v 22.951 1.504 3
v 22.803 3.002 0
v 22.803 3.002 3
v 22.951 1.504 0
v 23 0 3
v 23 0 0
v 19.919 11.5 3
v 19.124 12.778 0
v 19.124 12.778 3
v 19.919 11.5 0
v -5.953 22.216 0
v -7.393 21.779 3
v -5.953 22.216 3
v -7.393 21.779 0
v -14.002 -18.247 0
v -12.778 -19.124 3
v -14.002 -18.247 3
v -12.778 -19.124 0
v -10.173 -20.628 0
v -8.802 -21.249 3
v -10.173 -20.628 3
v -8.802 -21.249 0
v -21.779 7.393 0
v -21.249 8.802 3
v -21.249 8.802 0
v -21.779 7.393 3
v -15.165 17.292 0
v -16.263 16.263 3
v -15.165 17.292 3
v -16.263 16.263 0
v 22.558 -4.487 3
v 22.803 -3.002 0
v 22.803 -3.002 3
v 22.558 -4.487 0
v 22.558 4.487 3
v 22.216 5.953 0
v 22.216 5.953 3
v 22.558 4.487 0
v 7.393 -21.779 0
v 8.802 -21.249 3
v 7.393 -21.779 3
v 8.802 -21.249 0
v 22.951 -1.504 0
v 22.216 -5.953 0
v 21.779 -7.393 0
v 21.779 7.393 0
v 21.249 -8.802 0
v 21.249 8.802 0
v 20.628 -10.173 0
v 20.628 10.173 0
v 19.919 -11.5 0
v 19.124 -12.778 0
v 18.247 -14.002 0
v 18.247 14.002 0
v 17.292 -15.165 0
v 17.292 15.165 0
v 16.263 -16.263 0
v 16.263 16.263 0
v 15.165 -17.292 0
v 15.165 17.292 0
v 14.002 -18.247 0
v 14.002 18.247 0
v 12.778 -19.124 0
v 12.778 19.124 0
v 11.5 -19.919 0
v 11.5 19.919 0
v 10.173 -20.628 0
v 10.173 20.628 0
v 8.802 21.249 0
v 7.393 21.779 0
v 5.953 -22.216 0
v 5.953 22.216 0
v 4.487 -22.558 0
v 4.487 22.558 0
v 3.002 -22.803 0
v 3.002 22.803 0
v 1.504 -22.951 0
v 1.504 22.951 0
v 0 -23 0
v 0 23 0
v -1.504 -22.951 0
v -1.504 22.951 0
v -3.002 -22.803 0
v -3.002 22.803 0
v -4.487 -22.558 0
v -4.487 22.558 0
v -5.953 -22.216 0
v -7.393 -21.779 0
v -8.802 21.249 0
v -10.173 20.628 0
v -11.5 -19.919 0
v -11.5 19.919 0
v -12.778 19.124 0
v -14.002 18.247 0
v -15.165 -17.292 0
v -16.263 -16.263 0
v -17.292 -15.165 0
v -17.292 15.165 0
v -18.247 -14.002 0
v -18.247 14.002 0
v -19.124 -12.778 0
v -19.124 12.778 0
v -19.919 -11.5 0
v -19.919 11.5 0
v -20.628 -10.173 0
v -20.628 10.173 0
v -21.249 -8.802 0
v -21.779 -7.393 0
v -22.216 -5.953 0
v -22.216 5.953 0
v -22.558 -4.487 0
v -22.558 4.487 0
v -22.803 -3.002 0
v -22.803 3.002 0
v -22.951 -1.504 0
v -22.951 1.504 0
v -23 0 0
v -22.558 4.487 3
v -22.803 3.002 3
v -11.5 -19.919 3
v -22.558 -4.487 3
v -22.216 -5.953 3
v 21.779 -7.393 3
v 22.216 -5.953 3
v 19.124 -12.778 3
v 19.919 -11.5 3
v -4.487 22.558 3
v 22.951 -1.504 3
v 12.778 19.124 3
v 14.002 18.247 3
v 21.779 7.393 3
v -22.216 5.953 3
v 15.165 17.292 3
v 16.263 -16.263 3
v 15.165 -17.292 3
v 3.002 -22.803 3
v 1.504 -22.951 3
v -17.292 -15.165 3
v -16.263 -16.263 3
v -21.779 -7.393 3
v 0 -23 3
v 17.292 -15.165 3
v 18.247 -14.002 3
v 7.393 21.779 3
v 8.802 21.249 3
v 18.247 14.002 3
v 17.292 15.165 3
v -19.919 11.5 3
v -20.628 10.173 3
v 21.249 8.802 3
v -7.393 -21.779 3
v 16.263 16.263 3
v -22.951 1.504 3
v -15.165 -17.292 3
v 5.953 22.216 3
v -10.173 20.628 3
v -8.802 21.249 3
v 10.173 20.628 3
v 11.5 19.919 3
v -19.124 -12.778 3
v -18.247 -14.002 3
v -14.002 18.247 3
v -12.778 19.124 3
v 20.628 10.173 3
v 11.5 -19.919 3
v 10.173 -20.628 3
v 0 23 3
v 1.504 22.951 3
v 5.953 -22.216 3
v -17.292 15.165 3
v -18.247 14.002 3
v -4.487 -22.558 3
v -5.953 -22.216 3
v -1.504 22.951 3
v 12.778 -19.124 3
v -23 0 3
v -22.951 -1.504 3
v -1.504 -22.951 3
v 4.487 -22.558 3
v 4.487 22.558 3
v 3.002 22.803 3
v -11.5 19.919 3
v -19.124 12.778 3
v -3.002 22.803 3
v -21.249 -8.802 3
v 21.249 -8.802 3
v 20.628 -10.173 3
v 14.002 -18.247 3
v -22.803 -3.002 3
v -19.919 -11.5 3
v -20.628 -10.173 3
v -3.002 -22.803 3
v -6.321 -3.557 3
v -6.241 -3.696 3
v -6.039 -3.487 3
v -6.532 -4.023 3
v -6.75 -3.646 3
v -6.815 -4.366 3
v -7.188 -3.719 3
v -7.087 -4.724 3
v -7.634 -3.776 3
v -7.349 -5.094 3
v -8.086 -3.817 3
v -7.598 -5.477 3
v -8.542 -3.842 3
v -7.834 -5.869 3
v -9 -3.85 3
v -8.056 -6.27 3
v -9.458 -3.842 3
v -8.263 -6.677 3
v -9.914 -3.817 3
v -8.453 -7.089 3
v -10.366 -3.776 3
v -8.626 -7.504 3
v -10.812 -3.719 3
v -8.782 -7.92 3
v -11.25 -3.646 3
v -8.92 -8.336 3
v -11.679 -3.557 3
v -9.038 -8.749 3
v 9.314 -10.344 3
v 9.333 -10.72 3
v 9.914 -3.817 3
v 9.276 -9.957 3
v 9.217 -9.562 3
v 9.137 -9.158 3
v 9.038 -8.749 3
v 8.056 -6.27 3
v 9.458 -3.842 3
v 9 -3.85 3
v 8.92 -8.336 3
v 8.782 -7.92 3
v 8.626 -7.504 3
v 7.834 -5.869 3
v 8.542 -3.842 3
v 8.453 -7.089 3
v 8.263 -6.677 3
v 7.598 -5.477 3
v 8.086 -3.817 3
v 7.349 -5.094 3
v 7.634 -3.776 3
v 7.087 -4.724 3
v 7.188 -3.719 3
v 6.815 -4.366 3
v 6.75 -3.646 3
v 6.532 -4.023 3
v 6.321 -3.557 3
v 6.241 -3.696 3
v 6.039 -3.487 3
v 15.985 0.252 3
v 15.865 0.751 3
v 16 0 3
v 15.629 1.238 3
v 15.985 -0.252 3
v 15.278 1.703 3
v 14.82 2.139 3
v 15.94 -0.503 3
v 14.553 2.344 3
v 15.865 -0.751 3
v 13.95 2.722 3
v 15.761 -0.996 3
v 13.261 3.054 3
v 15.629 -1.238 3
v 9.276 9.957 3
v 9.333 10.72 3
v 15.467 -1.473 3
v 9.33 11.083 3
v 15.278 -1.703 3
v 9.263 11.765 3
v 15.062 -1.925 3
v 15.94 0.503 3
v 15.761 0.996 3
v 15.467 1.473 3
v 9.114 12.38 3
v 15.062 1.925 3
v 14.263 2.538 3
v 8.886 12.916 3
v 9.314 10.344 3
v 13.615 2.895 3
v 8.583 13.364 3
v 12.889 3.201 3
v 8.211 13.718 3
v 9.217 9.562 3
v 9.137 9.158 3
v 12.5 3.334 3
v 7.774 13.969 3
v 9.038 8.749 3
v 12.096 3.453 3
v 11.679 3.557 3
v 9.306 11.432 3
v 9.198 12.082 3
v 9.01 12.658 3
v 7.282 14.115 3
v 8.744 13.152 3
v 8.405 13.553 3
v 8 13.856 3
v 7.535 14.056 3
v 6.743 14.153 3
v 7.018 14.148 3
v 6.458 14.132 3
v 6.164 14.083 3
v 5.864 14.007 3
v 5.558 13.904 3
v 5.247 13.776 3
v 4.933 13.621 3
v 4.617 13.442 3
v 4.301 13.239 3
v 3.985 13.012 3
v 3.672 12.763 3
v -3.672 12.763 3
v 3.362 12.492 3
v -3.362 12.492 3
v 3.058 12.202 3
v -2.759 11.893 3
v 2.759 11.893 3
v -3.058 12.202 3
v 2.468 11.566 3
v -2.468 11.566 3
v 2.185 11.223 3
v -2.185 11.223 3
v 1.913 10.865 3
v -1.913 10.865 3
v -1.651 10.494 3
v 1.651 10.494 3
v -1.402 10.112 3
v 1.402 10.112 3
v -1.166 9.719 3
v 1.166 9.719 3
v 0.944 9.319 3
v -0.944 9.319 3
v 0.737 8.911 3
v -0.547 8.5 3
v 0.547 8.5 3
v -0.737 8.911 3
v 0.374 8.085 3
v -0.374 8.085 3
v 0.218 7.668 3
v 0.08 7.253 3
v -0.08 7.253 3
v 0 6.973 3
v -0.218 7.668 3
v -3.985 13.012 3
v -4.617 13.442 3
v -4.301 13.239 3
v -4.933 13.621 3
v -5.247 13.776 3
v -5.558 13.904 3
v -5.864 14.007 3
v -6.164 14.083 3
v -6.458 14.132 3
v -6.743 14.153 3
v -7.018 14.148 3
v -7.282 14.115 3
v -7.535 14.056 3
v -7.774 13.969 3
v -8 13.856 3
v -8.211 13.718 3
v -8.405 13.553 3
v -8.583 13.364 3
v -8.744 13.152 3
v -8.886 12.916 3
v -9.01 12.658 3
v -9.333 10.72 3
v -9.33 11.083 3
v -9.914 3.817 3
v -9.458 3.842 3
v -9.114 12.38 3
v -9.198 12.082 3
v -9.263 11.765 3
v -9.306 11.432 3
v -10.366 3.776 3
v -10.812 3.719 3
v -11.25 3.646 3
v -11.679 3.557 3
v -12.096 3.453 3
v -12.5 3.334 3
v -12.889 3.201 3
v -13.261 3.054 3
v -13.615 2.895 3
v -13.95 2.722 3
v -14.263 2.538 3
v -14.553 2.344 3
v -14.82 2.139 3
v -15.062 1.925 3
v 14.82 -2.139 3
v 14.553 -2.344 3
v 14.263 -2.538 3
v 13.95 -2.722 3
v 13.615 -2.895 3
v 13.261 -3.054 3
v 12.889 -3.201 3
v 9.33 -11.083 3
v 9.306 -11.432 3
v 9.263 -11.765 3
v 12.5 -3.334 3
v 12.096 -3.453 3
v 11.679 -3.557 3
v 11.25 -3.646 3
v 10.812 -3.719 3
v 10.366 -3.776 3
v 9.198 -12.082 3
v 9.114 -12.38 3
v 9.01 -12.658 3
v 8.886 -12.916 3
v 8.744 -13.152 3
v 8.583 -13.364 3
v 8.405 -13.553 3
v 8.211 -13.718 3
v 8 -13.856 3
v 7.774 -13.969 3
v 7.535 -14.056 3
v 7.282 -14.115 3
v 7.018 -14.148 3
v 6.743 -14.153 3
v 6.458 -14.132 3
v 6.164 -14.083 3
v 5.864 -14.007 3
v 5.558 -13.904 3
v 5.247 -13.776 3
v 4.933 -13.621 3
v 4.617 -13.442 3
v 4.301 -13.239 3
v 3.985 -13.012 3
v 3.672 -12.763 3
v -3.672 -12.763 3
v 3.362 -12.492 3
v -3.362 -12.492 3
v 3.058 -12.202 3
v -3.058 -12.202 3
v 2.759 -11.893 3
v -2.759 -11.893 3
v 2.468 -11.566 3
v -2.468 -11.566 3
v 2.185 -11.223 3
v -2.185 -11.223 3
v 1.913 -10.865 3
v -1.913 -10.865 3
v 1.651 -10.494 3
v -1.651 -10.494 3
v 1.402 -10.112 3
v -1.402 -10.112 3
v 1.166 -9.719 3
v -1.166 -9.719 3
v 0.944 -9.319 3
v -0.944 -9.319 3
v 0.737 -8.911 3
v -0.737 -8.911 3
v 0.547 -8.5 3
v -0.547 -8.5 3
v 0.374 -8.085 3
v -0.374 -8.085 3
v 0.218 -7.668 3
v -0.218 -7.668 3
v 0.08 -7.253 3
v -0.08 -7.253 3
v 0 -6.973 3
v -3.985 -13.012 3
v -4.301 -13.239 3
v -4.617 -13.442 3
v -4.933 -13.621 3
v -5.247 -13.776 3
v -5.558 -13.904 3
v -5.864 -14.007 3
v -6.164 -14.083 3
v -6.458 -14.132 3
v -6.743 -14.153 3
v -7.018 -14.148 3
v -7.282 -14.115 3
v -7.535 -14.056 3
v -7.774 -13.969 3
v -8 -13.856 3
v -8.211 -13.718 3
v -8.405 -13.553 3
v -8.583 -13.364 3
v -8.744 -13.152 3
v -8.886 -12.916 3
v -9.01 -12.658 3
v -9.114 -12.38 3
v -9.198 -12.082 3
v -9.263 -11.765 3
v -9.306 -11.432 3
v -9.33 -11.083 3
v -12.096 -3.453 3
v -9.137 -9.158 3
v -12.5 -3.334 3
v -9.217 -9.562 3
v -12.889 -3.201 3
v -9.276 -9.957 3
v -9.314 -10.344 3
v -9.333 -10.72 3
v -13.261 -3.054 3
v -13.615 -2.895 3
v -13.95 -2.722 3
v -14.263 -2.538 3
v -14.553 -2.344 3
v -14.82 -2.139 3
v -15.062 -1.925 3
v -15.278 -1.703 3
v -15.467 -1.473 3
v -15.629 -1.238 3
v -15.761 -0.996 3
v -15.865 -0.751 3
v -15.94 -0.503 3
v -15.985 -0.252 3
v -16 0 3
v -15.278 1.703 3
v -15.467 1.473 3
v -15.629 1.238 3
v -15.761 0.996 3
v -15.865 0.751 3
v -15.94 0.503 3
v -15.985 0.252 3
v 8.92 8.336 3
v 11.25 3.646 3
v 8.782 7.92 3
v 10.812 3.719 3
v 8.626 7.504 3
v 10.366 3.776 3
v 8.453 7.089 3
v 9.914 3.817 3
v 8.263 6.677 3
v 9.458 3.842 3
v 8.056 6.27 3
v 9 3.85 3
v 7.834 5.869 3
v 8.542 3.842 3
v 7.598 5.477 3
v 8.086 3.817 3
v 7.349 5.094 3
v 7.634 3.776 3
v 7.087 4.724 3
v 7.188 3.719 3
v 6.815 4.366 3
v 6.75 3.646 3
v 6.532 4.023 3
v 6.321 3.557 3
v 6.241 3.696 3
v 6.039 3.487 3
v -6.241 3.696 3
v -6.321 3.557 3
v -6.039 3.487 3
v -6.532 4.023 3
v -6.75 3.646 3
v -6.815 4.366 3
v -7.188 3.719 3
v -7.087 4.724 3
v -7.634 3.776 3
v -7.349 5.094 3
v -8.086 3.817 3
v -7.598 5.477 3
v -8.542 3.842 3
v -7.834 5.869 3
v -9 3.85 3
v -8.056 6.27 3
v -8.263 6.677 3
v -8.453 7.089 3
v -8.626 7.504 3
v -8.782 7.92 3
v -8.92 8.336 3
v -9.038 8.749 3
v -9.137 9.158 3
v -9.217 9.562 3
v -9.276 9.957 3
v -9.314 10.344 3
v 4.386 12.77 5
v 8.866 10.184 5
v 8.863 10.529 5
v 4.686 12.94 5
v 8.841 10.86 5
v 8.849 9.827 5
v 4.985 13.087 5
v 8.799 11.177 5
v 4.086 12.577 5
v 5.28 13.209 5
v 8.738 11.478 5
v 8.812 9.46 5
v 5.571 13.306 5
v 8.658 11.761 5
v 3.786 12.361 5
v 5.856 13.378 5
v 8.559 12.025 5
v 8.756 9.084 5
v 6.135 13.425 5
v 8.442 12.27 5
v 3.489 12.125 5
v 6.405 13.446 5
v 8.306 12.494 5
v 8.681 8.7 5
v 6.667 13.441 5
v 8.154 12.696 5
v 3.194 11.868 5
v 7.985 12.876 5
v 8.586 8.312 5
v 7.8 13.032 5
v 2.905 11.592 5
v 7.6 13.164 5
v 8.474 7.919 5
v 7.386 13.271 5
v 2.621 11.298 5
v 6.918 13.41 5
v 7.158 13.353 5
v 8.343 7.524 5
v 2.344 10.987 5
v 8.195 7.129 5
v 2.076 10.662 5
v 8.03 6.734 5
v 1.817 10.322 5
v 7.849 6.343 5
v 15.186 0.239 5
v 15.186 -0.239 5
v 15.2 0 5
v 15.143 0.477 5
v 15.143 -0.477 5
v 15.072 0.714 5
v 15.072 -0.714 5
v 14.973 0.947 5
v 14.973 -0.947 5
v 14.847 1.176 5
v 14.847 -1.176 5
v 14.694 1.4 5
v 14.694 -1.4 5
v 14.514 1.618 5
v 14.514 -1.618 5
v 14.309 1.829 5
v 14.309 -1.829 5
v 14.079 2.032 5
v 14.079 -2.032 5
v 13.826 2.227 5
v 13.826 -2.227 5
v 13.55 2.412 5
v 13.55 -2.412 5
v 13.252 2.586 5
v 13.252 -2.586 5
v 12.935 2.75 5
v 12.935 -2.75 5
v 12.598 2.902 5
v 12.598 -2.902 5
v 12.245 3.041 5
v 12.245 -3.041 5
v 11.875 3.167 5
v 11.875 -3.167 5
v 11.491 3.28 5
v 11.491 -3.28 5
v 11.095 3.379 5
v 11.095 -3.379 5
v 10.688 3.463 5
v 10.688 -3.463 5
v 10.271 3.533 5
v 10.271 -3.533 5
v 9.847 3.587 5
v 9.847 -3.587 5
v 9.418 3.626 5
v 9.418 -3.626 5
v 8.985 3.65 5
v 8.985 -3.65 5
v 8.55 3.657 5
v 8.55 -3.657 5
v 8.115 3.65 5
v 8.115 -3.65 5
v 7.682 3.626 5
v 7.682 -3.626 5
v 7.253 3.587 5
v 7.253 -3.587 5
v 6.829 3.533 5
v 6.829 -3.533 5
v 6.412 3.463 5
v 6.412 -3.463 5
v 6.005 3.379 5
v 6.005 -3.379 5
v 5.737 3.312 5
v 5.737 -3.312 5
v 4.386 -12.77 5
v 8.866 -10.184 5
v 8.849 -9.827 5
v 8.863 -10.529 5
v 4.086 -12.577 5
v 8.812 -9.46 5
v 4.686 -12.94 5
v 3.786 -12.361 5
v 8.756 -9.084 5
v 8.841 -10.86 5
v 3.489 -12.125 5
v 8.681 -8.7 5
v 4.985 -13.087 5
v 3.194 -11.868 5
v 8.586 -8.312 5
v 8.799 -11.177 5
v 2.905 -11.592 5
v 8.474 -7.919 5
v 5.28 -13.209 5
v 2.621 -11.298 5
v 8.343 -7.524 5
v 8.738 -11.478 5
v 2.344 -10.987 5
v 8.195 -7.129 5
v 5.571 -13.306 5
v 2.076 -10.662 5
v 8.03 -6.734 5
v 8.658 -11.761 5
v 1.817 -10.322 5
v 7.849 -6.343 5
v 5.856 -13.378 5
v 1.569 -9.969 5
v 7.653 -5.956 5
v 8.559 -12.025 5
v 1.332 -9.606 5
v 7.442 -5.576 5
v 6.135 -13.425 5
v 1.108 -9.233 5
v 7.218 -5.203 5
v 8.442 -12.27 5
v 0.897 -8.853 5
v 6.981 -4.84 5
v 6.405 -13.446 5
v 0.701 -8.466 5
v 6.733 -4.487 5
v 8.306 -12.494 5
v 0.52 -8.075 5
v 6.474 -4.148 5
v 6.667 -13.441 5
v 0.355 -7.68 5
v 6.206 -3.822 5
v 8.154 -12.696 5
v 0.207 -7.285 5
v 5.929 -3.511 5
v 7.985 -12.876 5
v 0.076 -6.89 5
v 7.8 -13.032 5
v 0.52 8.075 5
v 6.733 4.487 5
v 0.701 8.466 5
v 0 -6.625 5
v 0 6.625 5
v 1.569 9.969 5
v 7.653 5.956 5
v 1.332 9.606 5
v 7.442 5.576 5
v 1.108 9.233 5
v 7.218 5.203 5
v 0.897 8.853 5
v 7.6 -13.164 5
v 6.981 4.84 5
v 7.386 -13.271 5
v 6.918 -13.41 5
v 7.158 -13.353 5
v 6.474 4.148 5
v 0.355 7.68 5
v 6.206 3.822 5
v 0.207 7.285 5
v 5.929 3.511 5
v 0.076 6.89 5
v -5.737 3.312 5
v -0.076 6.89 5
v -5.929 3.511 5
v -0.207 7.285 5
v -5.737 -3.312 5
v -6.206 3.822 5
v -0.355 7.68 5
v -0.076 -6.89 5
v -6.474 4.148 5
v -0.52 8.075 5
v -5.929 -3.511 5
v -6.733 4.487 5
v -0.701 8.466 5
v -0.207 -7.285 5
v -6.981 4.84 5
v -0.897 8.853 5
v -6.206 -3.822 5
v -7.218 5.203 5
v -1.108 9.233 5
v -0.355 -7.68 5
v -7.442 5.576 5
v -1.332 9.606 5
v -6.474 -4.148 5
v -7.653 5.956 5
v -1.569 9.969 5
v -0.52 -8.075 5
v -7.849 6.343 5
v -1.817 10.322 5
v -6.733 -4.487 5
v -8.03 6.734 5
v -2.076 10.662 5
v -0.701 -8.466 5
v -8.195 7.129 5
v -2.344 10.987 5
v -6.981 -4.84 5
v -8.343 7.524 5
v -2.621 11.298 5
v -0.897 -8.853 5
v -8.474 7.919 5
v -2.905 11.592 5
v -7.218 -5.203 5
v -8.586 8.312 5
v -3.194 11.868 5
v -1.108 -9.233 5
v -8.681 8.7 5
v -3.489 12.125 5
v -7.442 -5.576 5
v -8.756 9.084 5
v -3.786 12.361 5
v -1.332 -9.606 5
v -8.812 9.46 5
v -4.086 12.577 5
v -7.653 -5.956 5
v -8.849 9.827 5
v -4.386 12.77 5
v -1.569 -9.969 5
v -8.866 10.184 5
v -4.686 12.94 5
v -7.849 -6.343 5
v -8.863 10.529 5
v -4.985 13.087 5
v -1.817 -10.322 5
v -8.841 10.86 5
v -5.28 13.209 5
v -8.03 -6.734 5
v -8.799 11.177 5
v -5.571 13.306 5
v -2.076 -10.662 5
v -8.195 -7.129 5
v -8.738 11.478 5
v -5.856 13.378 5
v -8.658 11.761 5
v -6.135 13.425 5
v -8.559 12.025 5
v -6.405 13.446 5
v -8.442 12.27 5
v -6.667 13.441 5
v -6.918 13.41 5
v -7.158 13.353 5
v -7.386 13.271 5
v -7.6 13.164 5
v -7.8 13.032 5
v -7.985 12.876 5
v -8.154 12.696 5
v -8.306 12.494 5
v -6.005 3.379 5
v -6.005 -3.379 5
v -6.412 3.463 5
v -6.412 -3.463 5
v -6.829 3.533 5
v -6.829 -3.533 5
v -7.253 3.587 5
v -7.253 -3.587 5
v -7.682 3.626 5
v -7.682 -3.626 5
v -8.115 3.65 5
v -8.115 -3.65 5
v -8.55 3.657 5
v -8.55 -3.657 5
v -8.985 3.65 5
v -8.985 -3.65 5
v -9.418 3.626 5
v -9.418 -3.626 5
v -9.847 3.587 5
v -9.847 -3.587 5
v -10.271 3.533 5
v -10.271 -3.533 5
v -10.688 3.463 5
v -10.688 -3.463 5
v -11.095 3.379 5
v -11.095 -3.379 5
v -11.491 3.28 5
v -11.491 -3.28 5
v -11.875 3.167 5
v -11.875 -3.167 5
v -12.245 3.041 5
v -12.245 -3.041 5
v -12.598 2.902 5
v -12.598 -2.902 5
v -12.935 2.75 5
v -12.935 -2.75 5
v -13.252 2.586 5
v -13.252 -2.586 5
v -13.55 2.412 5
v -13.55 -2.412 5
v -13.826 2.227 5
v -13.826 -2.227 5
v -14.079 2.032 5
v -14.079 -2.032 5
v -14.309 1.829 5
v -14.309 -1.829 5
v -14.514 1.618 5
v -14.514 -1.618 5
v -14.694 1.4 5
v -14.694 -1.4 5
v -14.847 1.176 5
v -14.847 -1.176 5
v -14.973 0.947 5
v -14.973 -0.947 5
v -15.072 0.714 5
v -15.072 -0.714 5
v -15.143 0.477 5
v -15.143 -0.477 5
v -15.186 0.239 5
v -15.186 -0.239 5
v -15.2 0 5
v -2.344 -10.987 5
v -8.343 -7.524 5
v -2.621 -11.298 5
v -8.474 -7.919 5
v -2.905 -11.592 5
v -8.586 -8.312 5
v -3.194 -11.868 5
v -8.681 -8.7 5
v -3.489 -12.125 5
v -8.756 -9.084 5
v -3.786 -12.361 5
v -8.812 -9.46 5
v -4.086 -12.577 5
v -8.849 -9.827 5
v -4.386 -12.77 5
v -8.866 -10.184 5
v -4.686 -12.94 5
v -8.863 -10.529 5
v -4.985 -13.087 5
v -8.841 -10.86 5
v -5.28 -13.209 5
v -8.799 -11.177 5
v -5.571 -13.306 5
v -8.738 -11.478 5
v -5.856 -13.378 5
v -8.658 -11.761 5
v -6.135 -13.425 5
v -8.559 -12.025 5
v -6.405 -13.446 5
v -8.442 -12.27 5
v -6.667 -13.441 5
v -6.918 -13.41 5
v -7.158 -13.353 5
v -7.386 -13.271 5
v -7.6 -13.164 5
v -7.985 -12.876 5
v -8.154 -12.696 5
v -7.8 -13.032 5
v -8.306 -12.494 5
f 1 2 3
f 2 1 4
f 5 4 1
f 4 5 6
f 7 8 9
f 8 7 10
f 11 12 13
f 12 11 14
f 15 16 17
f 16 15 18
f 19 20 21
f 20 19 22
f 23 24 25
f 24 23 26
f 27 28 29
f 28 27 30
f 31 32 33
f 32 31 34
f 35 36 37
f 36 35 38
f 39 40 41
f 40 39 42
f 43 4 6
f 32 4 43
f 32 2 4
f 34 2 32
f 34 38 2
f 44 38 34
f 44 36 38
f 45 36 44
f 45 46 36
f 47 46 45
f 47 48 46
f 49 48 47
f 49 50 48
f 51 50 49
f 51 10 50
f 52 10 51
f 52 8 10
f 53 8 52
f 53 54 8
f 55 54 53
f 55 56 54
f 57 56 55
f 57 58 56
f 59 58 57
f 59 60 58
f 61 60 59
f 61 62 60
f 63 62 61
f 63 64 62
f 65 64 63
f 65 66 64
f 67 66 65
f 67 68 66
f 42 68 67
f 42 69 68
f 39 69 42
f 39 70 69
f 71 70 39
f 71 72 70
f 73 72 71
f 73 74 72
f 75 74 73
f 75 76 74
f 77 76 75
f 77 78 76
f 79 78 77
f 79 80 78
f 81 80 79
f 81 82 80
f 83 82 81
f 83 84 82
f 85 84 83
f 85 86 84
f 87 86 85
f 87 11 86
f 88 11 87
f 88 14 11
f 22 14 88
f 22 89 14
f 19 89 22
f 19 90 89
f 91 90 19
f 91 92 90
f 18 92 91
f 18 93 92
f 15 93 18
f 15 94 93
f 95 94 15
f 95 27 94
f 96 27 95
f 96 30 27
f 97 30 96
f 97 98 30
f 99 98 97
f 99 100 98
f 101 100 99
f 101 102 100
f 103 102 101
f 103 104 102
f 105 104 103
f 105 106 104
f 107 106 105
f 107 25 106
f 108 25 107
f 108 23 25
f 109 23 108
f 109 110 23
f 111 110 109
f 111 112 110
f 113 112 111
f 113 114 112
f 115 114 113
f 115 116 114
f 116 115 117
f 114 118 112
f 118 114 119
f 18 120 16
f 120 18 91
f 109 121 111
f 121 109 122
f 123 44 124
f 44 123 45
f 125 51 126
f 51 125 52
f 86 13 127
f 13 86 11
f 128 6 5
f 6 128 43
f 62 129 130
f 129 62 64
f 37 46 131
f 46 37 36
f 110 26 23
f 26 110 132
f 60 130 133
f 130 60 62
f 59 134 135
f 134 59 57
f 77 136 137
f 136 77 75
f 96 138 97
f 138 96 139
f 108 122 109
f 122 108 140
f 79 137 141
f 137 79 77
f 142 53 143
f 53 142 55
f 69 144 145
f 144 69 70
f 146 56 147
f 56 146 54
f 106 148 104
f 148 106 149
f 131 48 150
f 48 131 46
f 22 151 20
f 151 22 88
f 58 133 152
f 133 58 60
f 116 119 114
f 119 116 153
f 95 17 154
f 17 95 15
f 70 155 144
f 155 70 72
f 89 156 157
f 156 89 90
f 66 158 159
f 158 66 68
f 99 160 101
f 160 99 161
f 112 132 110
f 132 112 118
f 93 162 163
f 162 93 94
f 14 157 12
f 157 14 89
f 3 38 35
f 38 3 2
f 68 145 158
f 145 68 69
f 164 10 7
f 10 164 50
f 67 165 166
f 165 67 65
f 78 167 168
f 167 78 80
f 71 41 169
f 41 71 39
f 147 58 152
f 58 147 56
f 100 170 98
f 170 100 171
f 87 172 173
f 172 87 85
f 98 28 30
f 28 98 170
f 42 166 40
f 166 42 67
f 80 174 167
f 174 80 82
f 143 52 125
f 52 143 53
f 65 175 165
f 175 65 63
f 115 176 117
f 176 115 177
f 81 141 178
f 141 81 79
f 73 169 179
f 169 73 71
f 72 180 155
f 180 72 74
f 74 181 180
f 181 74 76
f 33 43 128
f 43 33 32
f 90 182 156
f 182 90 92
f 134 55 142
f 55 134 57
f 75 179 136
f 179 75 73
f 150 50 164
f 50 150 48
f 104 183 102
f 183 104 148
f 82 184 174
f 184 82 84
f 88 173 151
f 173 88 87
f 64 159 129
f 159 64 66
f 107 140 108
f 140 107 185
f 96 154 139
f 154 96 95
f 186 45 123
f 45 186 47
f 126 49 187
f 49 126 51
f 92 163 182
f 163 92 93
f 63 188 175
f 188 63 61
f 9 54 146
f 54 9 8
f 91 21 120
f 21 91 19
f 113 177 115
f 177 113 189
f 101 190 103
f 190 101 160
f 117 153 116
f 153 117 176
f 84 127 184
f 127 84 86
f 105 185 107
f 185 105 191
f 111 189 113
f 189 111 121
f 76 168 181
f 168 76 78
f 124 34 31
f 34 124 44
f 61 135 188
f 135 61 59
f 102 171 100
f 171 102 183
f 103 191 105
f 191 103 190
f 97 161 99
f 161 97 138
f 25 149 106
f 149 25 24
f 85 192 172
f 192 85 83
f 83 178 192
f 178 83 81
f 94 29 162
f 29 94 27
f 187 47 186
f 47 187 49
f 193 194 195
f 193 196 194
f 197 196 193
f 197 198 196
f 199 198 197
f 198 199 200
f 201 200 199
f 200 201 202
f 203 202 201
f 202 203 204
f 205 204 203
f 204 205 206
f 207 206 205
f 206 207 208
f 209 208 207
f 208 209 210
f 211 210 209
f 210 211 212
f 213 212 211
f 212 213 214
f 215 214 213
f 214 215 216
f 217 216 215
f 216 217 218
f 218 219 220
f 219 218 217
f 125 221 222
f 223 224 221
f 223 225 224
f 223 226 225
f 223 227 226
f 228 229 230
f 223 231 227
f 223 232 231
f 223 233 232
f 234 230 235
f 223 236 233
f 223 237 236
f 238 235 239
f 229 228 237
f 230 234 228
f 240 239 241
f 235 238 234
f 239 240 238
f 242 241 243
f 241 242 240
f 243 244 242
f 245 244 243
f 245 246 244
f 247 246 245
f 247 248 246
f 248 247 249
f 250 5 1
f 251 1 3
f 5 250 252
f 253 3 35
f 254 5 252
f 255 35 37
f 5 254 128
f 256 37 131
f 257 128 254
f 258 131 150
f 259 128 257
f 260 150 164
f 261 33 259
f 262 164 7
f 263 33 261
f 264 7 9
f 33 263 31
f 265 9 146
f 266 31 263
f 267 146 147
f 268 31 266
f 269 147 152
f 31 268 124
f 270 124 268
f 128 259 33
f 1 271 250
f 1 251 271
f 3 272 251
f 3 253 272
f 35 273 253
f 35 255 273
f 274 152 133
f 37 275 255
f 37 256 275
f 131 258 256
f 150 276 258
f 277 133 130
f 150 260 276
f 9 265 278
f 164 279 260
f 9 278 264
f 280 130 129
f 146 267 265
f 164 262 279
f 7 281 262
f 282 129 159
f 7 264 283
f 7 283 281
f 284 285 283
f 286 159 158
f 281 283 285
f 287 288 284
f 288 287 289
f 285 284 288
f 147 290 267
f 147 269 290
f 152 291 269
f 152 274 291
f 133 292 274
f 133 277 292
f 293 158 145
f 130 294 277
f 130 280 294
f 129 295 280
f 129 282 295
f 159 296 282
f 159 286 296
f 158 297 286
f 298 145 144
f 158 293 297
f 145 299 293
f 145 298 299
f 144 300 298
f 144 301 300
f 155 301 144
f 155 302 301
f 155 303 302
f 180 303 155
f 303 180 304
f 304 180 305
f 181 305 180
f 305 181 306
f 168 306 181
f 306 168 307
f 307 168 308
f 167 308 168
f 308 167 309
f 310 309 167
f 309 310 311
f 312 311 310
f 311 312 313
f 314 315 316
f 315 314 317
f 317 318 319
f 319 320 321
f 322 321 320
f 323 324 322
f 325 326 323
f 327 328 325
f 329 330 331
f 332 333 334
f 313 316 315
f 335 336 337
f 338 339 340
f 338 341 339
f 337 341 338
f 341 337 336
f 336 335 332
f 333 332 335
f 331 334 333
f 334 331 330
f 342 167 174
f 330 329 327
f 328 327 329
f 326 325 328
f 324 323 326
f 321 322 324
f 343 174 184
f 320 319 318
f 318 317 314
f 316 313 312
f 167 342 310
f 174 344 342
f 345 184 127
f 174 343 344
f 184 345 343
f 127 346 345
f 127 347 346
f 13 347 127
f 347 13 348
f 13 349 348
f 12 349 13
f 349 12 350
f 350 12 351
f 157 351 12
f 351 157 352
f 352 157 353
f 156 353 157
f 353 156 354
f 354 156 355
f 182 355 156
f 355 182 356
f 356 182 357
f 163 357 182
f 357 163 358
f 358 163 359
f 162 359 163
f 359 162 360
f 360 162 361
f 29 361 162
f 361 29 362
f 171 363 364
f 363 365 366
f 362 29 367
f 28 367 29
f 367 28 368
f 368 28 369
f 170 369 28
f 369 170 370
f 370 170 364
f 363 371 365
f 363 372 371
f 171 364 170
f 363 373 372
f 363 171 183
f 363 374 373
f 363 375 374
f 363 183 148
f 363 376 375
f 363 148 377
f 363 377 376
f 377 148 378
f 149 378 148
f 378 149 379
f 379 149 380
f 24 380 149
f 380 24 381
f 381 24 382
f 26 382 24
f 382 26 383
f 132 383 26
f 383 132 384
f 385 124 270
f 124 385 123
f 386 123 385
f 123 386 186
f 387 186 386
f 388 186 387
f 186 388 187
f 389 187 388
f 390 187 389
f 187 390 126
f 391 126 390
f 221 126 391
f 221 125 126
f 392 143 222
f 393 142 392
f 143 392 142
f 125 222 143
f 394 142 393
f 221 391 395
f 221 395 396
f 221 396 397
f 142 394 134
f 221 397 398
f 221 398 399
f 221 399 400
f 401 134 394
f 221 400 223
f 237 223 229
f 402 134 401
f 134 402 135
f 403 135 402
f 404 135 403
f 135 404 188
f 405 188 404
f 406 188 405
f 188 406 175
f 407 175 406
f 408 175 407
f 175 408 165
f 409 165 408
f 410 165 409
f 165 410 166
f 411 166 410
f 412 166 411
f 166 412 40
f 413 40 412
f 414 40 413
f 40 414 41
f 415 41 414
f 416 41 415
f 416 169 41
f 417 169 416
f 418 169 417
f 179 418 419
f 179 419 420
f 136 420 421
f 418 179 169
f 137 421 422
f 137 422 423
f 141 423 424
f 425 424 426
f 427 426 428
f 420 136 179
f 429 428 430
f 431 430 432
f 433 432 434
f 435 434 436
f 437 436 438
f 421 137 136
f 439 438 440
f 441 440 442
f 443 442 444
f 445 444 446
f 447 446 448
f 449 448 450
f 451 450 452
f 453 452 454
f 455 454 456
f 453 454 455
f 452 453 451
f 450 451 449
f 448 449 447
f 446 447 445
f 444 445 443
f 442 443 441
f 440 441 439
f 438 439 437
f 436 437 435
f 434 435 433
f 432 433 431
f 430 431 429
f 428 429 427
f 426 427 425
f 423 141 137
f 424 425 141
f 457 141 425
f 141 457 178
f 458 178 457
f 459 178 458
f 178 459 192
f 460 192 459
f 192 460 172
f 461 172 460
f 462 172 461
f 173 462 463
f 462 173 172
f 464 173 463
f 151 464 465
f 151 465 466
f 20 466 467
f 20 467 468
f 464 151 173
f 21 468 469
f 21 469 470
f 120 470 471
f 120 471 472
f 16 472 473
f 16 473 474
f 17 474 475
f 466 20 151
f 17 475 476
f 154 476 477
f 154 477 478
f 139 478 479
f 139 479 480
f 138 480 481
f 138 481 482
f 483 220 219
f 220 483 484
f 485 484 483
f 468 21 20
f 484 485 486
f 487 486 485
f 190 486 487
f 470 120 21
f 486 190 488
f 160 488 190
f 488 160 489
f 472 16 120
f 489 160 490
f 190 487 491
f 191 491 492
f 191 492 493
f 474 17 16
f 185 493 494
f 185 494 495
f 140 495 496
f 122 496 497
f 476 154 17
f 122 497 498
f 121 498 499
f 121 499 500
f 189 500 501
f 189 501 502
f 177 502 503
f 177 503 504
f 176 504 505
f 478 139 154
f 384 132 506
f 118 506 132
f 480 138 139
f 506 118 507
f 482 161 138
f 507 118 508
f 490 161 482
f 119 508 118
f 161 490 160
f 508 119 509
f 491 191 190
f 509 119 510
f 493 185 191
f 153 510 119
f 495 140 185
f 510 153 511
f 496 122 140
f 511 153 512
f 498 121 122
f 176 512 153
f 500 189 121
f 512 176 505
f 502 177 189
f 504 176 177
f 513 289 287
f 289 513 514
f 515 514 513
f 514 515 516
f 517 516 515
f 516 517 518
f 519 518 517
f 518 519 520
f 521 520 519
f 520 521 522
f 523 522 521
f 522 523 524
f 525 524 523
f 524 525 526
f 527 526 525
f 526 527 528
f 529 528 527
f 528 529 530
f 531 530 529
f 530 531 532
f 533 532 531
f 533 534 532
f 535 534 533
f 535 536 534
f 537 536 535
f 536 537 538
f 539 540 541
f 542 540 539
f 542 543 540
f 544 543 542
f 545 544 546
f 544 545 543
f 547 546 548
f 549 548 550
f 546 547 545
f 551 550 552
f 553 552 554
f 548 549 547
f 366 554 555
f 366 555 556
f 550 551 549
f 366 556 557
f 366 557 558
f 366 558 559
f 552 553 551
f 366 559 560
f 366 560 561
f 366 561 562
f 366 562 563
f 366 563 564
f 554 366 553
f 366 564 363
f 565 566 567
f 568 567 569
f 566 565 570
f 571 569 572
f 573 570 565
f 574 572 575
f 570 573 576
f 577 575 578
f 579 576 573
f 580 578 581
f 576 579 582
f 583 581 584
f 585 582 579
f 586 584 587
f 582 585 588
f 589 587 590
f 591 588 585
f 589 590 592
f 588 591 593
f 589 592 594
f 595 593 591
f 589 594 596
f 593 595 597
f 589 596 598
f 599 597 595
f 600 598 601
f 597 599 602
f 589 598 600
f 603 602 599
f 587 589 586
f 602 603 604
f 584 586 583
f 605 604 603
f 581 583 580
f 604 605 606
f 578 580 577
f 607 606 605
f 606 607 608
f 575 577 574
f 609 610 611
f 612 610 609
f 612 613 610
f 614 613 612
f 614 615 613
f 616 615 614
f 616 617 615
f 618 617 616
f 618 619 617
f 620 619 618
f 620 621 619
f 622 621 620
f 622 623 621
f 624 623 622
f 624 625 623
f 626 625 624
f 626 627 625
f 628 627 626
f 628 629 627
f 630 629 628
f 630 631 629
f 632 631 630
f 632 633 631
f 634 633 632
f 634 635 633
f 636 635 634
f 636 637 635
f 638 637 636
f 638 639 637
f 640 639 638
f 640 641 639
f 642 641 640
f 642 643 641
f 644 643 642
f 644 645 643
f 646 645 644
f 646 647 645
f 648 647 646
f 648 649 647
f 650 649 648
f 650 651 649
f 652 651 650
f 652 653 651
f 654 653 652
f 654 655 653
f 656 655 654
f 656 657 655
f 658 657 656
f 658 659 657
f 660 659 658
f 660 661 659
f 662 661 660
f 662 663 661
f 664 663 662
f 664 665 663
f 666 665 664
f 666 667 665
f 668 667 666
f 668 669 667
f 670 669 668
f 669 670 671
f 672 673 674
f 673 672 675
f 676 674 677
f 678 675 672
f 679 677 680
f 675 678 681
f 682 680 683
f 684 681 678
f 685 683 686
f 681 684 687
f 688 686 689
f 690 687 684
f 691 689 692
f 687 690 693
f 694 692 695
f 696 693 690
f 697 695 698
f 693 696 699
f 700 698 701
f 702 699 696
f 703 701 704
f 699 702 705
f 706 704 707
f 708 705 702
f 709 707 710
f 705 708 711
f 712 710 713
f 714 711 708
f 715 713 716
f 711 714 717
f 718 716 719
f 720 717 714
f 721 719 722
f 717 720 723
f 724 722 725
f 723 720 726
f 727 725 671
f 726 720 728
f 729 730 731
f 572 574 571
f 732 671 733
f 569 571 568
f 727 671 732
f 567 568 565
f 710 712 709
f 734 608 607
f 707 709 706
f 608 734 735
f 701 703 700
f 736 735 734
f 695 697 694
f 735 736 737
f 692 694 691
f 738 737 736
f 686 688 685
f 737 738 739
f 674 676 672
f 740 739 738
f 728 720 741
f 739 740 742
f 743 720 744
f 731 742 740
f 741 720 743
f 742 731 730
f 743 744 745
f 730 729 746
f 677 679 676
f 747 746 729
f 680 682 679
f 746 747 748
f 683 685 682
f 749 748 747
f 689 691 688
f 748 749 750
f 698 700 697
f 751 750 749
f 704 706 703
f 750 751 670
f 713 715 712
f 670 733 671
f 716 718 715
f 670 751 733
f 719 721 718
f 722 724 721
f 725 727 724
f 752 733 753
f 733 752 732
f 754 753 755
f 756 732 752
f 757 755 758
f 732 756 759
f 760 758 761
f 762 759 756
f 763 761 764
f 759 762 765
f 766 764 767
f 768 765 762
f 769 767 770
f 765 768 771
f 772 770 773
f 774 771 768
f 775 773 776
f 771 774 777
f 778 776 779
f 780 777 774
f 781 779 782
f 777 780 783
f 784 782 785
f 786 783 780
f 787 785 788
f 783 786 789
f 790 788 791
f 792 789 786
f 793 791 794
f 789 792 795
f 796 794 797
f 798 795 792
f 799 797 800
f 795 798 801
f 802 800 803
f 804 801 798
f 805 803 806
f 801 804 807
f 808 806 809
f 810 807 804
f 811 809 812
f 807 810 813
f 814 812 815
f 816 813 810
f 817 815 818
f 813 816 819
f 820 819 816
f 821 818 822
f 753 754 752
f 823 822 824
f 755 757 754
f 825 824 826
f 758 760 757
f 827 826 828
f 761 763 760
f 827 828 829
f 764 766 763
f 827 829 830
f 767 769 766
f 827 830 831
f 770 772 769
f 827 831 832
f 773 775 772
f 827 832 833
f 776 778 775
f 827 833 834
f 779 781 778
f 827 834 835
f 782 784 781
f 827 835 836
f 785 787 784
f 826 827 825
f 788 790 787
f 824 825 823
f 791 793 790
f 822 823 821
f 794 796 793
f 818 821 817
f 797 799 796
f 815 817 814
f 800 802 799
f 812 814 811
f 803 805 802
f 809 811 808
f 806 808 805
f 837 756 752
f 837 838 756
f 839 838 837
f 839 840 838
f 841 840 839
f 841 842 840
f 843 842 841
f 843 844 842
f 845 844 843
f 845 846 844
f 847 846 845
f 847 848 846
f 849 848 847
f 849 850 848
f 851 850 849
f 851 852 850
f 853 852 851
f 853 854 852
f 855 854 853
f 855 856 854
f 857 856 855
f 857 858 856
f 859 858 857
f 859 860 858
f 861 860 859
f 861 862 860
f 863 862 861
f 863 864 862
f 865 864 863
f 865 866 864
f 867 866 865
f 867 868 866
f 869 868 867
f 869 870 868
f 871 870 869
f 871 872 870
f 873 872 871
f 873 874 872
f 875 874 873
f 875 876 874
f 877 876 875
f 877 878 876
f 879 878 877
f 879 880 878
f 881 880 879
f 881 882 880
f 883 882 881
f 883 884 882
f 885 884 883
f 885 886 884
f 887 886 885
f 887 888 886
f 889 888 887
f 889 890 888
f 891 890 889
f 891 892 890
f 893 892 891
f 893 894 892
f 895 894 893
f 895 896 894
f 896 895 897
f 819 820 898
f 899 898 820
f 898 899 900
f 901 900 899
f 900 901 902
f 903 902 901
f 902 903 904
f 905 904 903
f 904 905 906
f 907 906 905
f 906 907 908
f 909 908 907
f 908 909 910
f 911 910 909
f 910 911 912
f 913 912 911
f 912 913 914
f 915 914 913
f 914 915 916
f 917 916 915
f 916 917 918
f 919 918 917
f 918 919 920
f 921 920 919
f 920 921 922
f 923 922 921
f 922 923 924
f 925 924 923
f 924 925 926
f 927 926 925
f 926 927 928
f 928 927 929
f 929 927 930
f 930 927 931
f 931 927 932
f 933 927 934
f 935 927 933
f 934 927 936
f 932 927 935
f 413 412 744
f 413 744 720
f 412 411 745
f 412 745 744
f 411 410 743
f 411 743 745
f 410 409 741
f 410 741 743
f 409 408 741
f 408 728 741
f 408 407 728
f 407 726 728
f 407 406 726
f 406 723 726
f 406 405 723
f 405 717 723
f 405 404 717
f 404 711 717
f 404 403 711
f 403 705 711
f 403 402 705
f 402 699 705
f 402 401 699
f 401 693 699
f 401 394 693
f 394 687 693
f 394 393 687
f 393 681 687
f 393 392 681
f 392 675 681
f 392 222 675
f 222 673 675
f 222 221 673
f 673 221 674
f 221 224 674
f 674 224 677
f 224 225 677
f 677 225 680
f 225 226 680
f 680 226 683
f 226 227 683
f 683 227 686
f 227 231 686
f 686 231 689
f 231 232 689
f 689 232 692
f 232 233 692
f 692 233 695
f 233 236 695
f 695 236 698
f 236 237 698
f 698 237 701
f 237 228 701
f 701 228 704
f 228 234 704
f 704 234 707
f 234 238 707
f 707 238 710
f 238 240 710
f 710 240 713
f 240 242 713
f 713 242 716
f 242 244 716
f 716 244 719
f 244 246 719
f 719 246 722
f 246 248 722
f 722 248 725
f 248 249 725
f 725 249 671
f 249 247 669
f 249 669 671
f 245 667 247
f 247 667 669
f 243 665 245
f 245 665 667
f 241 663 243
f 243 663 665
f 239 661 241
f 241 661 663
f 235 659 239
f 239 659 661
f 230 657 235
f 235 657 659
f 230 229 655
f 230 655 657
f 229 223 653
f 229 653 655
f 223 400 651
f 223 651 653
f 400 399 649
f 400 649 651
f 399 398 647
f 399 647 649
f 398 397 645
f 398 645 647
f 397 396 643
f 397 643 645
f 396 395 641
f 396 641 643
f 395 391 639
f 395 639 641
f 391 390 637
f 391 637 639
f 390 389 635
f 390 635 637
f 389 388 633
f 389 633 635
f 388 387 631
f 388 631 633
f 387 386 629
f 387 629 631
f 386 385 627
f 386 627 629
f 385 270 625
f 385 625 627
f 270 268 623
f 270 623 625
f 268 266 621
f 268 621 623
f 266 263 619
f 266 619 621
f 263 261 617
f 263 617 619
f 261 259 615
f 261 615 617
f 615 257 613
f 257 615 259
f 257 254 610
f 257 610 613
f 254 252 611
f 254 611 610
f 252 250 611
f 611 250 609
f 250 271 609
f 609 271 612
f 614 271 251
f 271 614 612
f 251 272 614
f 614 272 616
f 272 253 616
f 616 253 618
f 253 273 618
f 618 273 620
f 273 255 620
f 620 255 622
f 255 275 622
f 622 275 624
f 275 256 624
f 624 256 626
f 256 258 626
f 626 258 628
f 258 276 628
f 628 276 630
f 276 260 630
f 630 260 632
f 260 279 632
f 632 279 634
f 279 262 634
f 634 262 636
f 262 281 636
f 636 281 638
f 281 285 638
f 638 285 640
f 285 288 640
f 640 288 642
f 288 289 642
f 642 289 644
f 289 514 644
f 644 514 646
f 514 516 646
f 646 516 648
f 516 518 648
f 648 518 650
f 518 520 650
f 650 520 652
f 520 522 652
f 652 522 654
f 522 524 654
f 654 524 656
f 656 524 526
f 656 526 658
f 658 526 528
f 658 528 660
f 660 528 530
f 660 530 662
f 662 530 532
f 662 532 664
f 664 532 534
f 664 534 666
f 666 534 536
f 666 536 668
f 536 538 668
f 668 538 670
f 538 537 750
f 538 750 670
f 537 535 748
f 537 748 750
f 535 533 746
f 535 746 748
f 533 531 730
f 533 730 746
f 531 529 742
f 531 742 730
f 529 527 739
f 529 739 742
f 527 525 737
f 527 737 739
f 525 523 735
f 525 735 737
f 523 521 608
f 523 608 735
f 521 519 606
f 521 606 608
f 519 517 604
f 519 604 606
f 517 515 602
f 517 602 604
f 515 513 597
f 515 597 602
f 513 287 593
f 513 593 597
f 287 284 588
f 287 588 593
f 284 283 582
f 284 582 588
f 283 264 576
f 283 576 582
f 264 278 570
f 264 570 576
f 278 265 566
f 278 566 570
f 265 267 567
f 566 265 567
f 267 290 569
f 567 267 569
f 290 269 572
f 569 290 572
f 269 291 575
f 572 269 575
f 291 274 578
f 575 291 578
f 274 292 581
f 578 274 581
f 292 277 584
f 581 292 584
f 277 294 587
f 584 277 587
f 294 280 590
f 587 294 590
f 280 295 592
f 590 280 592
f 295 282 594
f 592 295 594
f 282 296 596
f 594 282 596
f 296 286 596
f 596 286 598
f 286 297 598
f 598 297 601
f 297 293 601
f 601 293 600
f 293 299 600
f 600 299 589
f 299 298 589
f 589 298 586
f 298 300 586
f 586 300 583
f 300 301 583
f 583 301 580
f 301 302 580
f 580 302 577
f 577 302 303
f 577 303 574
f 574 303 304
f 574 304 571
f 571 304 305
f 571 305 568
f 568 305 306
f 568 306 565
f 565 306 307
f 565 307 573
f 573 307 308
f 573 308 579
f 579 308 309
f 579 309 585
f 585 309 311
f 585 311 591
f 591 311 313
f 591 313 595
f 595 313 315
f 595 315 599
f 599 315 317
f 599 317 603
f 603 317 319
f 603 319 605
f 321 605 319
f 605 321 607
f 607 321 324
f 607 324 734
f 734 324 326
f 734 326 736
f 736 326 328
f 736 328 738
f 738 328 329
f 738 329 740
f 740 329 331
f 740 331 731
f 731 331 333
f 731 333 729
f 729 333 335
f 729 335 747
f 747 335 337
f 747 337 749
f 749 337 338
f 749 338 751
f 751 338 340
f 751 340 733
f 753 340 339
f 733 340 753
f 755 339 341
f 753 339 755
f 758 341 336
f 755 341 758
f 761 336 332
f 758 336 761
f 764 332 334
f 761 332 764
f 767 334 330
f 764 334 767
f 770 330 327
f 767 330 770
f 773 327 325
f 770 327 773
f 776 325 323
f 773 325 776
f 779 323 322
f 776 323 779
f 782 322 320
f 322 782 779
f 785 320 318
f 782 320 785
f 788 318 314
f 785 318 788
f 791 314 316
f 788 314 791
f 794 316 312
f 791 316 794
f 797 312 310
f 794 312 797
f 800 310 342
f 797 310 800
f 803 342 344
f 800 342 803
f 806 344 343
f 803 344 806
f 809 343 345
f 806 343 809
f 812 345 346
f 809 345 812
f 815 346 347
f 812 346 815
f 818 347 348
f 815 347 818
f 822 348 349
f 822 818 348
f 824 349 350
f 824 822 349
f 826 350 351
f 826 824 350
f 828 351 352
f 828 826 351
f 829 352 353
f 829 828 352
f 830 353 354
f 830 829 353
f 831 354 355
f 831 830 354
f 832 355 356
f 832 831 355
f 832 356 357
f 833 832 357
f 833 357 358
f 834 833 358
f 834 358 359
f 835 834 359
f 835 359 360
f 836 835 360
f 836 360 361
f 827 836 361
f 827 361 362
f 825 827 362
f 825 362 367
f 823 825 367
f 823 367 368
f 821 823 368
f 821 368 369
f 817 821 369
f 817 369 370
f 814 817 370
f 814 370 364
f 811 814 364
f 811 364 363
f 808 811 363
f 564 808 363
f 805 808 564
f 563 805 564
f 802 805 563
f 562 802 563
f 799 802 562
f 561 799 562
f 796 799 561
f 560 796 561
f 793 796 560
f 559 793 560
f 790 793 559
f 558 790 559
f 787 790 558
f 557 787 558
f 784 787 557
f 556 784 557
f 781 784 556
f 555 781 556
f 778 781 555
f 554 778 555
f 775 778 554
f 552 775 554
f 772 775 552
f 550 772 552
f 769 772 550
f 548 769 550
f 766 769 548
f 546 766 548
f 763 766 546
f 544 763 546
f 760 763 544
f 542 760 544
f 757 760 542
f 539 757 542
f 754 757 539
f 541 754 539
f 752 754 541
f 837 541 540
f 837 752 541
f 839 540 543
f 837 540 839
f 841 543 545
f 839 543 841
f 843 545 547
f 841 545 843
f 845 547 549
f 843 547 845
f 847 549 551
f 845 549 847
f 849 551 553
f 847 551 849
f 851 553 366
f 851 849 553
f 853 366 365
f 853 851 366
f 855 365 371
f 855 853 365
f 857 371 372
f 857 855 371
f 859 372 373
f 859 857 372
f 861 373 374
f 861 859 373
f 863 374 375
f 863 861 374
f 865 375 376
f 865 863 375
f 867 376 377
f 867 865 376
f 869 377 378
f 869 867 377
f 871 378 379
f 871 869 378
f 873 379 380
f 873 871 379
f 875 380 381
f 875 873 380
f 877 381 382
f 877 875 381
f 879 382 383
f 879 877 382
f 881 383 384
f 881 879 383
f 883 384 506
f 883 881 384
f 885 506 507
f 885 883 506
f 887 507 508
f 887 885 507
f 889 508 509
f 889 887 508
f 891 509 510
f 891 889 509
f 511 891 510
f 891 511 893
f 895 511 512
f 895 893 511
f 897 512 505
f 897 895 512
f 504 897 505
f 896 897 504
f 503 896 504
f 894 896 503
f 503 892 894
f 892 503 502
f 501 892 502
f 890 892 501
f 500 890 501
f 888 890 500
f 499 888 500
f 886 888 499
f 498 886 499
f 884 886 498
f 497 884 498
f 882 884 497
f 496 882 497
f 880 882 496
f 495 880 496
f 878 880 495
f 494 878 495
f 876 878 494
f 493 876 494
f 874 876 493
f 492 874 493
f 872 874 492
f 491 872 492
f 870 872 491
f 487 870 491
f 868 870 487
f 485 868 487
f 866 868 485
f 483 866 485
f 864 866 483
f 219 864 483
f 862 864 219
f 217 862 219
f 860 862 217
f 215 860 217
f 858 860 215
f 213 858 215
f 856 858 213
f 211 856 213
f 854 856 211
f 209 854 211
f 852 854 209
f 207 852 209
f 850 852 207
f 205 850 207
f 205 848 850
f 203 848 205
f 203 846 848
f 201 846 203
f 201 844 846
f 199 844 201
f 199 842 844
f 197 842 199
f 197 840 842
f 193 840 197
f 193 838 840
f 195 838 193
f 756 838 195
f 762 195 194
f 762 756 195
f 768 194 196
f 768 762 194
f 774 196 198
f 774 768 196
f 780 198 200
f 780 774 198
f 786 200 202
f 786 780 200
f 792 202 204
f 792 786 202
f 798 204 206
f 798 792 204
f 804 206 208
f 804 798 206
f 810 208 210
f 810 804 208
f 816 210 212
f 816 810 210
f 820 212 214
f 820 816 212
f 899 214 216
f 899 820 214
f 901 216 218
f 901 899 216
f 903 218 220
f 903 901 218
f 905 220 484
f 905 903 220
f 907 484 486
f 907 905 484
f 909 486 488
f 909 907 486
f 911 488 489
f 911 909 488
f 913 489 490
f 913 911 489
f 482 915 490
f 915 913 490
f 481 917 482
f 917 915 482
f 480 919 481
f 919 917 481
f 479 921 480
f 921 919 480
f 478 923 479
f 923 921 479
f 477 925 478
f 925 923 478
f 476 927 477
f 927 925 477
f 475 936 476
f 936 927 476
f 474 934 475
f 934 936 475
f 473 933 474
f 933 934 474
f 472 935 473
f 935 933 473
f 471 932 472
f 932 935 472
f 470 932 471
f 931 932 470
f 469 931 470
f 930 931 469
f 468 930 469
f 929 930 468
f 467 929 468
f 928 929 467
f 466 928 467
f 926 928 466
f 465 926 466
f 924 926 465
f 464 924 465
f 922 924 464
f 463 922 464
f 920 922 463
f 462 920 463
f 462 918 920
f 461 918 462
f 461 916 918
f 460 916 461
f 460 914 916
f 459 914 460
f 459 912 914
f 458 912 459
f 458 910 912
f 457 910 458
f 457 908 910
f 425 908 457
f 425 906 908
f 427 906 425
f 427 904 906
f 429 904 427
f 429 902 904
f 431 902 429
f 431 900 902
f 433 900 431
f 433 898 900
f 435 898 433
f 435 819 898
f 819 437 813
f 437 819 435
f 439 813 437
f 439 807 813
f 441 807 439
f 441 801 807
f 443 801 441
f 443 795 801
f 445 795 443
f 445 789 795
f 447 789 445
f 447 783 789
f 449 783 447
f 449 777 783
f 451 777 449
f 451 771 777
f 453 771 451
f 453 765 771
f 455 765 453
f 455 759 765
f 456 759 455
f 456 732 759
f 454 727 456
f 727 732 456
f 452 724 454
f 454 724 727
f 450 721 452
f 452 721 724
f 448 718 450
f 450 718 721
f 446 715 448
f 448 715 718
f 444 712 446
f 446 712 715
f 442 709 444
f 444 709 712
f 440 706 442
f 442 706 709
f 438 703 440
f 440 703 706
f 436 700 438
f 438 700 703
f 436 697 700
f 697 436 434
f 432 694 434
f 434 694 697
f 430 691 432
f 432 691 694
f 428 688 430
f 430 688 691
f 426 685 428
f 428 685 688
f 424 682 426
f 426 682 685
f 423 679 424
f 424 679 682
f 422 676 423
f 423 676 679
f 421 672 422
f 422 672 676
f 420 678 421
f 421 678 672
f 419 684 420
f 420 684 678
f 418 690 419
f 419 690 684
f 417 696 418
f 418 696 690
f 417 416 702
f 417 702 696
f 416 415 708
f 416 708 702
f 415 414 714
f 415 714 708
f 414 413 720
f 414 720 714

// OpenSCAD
$fn = 96;
part = is_undef(pbl_variant) ? "master" : pbl_variant;
module flower() {
  circle(r=5);
  for (a=[0:60:300]) rotate(a) translate([9,0]) scale([1,0.55]) circle(r=7);
}
module master() {
  cylinder(h=3,r=23);
  translate([0,0,3]) linear_extrude(height=2,scale=0.95) flower();
}
module tray() {
  difference() {
    cylinder(h=14,r=29);
    translate([0,0,2]) cylinder(h=14,r=26);
  }
  translate([0,0,2]) master();
}
if (part == "master") master();
else if (part == "tray") tray();
